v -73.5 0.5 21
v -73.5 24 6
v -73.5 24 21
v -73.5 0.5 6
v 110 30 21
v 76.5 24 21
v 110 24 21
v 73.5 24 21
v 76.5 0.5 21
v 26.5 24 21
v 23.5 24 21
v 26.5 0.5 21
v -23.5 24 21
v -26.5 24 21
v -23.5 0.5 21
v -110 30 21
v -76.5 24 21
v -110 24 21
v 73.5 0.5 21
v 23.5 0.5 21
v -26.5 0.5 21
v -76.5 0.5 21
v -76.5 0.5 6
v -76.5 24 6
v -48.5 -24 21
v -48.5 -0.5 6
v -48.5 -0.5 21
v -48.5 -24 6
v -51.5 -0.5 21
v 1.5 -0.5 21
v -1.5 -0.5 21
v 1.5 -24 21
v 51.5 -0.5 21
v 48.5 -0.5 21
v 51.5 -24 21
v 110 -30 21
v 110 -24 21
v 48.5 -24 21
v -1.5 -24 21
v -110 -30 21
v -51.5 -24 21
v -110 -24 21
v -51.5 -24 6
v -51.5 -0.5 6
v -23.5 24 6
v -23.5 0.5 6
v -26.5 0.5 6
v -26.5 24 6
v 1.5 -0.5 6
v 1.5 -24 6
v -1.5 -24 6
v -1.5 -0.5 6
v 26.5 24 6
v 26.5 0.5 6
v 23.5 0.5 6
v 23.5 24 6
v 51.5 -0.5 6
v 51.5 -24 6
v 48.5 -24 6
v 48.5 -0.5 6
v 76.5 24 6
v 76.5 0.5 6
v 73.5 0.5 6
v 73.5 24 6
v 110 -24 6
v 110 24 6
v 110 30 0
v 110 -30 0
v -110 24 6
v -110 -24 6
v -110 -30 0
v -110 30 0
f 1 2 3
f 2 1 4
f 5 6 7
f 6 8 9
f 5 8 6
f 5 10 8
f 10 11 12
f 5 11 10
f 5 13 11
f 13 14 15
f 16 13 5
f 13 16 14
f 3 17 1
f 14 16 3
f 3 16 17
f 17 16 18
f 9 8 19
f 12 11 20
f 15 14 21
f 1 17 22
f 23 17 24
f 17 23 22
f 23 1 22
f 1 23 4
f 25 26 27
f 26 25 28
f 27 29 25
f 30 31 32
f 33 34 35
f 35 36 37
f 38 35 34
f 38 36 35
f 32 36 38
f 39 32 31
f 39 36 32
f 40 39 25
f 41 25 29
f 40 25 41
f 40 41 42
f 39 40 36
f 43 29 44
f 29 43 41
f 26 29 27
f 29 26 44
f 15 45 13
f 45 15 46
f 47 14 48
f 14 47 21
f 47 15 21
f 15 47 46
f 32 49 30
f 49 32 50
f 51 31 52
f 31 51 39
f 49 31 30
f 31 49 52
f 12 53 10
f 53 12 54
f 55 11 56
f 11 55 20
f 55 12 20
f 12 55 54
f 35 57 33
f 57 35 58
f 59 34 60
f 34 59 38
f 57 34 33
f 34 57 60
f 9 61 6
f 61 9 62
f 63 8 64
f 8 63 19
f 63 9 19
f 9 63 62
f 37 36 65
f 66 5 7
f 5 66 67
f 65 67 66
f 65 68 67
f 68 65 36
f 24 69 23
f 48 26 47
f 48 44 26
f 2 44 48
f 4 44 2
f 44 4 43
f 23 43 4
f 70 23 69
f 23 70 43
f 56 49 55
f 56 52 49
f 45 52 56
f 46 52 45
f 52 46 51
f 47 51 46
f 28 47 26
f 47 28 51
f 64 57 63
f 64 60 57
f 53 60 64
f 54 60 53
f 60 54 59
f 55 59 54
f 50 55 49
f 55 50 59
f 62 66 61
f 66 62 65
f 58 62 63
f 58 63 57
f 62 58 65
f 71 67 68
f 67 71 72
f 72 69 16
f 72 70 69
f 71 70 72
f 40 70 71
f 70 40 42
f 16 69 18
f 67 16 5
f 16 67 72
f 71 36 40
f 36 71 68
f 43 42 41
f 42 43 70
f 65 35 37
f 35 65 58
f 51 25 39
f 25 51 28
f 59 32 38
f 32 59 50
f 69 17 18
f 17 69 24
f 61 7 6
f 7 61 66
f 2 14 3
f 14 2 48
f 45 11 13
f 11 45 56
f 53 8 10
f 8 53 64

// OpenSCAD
$fn = 32;

// ----------------------------------------------------------------------
// Rib frame 220 x 60 x 21
// 7 ribs at 25 mm pitch, staggered
// ----------------------------------------------------------------------

// --- parameters (mm) ---
frame = [220, 60, 6];  // base plate size (x, y, z)
rail_w = 6;            // side rail width
ribs = 7;              // number of ribs
rib_t = 3;             // rib thickness
rib_h = 15;            // rib height above the base plate
pitch = 25;            // pitch between rib centres

// --- derived feature positions (mm) ---
span = (ribs - 1) * pitch;          // = 150   distance between the outer ribs
origin_x = -span / 2;               // = -75   X of the first rib
rib_len = frame[1] / 2 - rail_w + 0.5;  // = 24.5   length of a staggered rib
rib_y = 0.5 + rib_len / 2;          // = 12.75   Y of a staggered rib centre
row_offset = 2 * rib_y;             // = 25.5   distance between the two rows
feature_centers = [
  [origin_x + 0 * pitch, rib_y],
  [origin_x + 1 * pitch, -rib_y],
  [origin_x + 2 * pitch, rib_y],
  [origin_x + 3 * pitch, -rib_y],
  [origin_x + 4 * pitch, rib_y],
  [origin_x + 5 * pitch, -rib_y],
  [origin_x + 6 * pitch, rib_y]
];   // rib centre line, drives the rib loop

// base plate, two side rails, then the ribs read straight off feature_centers
union() {
  translate([-frame[0] / 2, -frame[1] / 2, 0]) cube(frame);
  translate([-frame[0] / 2, -frame[1] / 2, 0]) cube([frame[0], rail_w, frame[2] + rib_h]);
  translate([-frame[0] / 2, frame[1] / 2 - rail_w, 0]) cube([frame[0], rail_w, frame[2] + rib_h]);
  for (centre = feature_centers)
    translate([centre[0] - rib_t / 2, centre[1] - rib_len / 2, frame[2] - 1])
      cube([rib_t, rib_len, rib_h + 1]);
}
